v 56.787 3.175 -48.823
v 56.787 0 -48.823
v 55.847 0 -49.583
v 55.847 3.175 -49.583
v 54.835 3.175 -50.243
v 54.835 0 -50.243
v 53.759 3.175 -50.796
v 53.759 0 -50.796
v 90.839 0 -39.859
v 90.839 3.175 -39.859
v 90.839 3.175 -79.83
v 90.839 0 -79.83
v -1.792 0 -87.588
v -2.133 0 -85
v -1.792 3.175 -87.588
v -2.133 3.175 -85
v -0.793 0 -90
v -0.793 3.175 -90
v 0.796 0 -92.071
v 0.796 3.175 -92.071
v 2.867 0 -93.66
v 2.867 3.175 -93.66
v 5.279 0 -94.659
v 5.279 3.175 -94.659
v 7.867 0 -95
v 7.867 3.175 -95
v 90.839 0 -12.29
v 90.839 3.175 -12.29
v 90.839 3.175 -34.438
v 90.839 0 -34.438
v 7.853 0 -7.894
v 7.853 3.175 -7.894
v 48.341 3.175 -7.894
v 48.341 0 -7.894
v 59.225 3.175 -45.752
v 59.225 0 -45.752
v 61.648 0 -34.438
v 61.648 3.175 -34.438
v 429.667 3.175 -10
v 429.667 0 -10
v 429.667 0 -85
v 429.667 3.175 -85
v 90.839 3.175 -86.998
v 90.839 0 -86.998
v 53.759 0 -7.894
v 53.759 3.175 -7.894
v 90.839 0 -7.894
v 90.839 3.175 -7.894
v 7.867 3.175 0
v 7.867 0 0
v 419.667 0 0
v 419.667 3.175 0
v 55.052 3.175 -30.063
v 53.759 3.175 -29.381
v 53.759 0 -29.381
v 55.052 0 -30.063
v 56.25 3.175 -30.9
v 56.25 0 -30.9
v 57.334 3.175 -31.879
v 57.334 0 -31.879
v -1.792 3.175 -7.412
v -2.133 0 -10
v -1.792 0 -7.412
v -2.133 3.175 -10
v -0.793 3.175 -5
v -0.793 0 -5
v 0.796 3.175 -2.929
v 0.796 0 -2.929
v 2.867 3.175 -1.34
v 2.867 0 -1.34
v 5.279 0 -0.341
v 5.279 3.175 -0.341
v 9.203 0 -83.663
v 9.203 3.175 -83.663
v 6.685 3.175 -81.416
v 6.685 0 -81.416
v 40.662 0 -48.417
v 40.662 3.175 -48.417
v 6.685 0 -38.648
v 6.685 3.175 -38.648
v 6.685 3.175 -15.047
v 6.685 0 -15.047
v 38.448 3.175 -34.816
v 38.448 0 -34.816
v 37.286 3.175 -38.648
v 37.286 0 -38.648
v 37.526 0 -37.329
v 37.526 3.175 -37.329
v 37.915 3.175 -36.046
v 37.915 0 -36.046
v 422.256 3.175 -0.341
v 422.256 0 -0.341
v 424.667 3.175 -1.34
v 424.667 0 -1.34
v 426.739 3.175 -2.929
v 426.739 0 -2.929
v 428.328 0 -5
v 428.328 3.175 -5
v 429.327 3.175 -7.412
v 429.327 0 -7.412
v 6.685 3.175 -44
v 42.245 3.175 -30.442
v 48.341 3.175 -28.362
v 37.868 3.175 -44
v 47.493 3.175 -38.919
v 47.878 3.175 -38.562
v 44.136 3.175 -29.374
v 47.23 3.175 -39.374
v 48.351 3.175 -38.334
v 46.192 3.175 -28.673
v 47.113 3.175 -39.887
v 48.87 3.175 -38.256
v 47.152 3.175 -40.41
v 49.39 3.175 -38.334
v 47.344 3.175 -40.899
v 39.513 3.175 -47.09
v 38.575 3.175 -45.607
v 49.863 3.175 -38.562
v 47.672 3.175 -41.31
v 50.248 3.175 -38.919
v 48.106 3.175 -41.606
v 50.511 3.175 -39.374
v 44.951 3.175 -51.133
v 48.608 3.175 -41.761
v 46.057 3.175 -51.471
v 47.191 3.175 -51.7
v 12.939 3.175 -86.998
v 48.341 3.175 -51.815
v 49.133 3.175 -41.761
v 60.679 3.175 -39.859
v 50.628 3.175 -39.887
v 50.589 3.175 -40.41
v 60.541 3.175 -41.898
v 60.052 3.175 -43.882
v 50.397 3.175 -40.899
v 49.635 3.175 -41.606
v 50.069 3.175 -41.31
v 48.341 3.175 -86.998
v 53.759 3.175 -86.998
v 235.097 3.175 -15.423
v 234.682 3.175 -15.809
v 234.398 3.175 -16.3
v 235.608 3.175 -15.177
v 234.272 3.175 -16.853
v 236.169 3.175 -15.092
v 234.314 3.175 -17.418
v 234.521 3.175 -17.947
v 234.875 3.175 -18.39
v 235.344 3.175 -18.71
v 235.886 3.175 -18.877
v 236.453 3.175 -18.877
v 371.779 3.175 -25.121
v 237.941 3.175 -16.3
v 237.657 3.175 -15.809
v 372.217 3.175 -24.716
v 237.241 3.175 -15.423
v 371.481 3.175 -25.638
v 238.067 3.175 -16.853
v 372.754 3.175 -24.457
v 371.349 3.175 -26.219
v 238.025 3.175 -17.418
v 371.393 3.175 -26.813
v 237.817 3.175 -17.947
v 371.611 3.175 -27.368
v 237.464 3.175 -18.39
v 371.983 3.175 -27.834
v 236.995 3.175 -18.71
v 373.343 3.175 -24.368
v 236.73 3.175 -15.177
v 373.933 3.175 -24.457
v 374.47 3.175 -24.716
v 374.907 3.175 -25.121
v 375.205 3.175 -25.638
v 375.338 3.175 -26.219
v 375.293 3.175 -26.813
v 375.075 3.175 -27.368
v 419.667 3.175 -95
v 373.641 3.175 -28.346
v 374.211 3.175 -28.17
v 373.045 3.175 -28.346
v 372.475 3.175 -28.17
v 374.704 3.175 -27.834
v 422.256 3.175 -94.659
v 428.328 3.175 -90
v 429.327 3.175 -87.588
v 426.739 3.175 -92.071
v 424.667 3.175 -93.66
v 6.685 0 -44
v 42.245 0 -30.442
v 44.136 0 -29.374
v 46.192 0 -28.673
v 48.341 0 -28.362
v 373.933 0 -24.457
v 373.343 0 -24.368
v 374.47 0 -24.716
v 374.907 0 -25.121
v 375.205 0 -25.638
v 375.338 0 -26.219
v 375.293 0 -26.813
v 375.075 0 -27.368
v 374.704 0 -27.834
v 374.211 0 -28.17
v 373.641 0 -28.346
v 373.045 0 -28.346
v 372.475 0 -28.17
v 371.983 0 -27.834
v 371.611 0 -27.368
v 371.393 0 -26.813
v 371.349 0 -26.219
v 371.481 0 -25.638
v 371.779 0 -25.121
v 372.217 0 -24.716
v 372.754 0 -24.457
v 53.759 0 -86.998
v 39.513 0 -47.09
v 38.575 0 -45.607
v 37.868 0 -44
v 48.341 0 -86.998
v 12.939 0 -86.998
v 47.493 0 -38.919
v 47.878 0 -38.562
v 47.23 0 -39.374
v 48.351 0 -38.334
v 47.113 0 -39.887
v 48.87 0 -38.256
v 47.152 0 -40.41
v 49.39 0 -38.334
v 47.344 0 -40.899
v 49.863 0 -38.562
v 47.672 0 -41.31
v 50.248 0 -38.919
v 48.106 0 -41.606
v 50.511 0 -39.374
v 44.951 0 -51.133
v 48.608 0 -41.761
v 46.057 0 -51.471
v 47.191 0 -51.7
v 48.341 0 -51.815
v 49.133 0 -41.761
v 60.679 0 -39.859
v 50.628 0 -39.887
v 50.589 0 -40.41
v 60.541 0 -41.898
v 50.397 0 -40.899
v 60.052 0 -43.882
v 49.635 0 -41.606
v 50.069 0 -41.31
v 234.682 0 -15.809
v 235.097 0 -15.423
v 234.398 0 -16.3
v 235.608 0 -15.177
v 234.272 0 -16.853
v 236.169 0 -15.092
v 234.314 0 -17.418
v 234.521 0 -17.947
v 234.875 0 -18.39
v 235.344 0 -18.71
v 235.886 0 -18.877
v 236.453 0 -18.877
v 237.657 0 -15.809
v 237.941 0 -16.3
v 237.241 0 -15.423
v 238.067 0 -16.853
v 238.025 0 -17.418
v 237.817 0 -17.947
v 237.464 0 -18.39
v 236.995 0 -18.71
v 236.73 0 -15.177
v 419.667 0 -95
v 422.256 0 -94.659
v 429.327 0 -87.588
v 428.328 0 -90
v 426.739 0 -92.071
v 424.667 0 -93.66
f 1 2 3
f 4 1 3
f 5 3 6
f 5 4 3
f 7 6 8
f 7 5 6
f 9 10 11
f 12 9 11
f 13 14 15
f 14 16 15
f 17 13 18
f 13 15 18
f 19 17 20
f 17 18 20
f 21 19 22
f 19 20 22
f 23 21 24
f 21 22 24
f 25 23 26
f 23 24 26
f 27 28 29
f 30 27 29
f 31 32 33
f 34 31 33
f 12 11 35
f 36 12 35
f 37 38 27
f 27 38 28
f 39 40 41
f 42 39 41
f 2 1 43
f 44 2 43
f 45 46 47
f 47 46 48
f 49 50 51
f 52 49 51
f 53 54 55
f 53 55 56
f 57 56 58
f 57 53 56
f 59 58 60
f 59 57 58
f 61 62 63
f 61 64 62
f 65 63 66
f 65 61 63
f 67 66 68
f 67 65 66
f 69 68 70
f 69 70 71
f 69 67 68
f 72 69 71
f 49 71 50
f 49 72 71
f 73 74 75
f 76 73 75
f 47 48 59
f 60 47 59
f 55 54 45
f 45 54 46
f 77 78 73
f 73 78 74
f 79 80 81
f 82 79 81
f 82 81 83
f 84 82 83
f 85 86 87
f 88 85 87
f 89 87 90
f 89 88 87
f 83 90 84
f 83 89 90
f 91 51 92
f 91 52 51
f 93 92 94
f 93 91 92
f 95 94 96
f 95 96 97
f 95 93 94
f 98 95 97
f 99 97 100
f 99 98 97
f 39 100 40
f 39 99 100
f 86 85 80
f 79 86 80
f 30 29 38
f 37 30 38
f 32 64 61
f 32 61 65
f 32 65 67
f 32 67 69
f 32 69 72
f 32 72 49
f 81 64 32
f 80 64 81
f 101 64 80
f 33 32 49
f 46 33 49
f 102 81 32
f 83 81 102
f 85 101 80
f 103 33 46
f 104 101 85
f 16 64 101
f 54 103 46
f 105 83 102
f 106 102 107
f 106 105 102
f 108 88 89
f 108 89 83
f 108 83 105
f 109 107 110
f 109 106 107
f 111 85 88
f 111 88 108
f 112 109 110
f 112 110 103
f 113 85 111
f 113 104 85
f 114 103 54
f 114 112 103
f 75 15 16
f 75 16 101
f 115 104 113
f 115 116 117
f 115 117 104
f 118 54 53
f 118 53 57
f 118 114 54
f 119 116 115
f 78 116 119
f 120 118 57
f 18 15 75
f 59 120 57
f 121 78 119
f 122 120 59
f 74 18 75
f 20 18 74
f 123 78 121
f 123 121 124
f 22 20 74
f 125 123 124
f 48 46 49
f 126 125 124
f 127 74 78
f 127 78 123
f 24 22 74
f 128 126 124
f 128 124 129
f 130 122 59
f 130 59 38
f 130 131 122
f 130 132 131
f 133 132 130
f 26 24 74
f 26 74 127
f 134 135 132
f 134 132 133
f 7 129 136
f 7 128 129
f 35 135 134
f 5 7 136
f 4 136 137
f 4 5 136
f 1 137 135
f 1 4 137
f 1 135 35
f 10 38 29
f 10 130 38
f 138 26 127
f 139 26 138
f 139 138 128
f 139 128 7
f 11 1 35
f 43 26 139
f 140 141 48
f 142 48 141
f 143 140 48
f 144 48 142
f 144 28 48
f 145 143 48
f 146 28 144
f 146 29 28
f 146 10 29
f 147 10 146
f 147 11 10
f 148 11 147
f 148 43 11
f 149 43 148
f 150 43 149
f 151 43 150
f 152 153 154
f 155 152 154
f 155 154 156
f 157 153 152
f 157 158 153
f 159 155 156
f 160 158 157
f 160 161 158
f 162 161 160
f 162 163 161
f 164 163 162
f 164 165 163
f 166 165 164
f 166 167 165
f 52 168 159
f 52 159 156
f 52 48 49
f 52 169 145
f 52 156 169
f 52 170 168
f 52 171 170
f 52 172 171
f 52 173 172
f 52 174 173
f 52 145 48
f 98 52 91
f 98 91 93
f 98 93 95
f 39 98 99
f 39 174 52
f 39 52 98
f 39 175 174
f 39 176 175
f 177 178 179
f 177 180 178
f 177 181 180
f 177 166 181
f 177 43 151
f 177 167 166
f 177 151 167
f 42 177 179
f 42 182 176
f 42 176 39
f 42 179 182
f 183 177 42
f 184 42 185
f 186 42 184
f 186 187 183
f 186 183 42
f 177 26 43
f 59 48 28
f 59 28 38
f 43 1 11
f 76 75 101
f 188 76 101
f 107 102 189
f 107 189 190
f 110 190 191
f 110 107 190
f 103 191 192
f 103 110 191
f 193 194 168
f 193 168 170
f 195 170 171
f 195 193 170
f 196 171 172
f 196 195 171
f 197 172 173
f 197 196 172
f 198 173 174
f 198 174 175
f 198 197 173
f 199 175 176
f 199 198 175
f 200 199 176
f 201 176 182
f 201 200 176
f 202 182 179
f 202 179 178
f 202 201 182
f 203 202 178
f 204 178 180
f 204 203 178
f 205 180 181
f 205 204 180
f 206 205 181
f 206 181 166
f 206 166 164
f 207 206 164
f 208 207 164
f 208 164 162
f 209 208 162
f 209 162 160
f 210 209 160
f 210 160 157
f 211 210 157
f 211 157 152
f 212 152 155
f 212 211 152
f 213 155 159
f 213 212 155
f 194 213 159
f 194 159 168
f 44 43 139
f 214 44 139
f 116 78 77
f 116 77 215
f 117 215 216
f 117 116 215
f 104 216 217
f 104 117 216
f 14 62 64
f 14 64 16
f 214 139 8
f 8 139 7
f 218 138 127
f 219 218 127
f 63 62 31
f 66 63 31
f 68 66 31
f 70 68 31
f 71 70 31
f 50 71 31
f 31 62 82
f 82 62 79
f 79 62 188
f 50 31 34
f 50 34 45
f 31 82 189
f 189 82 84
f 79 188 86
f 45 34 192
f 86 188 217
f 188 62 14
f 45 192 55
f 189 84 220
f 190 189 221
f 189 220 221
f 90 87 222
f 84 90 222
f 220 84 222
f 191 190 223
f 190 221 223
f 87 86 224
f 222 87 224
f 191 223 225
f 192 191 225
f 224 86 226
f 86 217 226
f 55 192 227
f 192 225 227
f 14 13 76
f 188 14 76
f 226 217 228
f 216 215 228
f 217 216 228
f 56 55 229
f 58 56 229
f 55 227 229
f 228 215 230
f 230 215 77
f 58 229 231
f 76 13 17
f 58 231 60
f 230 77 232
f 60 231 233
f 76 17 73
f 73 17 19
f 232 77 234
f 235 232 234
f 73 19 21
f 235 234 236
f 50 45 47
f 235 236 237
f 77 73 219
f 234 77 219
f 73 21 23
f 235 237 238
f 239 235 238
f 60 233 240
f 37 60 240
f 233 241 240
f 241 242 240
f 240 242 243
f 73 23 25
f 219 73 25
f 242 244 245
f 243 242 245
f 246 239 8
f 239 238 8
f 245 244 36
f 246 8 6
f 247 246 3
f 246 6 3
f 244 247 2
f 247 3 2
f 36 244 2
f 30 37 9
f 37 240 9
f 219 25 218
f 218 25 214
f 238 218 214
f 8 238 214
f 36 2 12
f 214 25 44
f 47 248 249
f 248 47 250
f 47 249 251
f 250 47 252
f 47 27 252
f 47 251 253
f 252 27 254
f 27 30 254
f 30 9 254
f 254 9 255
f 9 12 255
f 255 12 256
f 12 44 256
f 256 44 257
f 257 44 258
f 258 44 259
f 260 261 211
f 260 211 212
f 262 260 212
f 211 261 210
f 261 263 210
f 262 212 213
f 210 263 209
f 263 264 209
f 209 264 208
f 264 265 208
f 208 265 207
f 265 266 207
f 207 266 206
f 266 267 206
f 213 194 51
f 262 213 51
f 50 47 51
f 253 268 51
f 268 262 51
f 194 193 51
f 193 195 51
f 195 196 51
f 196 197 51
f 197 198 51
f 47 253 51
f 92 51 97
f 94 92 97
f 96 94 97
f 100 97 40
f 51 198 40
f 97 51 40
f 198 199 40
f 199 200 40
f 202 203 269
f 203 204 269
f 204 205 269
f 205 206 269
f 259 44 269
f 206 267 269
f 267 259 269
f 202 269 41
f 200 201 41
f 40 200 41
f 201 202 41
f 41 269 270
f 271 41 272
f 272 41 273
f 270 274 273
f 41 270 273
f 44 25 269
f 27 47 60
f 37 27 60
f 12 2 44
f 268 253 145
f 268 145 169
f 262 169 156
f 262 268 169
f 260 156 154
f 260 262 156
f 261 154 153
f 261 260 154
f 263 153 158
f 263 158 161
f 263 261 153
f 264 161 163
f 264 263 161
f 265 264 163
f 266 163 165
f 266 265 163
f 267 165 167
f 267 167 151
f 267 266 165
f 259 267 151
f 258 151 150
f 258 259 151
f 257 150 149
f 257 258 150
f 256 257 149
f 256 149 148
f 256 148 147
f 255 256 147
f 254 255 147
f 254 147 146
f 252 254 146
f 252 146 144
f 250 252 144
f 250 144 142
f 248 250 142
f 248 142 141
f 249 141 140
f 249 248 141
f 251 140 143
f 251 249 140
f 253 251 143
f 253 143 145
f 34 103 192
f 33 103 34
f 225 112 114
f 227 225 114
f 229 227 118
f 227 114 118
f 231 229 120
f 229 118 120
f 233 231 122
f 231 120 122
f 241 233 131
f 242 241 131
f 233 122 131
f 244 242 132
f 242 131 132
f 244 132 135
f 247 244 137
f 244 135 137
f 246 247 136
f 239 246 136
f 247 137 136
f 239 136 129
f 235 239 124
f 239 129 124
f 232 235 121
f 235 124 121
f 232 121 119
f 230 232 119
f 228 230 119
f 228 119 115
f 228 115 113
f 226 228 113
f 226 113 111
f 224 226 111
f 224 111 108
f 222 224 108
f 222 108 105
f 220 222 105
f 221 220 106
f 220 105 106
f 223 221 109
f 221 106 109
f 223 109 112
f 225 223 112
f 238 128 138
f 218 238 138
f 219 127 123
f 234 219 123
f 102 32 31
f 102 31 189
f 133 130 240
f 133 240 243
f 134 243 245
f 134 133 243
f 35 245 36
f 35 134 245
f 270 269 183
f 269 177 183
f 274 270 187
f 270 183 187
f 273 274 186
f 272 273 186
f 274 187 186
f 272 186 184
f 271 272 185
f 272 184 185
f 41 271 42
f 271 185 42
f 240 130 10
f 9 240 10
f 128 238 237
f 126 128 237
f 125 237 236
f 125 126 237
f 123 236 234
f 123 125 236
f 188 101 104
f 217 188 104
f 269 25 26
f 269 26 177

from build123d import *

# Parameters (mm, degrees)
SKETCH1_W           = 431.8
SKETCH1_H           = 95
SKETCH1_R           = 1.770184209
SKETCH1_R_2         = 1.902933344
SKETCH1_R_3         = 2
BOSS_EXTRUDE1_DEPTH = 3.175
FILLET1_R           = 10
SKETCH10_R          = 9.179936936
BOSS_EXTRUDE3_DEPTH = 3.175
SKETCH11_R          = 1.770587682
CUT_EXTRUDE5_DEPTH  = 3.175
CUT_EXTRUDE6_DEPTH  = 3.175
SKETCH13_R          = 11.741940518
BOSS_EXTRUDE4_DEPTH = 3.175
SKETCH14_R          = 1.762256498
CUT_EXTRUDE8_DEPTH  = 3.175


with BuildPart() as part:
    # Sketch1 → Boss-Extrude1 (new body)
    with BuildSketch(Plane(origin=(0, 0, 0), x_dir=(1, 0, 0), z_dir=(0, 1, 0))):
        with Locations((213.767466267, 47.5)):
            Rectangle(SKETCH1_W, SKETCH1_H)
        with Locations(Location((48.867466267, 40.050297191, 0), (0, 0, 270))):
            Circle(SKETCH1_R, mode=Mode.SUBTRACT)
        with Locations(Location((236.169368623, 16.995054431, 0), (0, 0, 270))):
            Circle(SKETCH1_R_2, mode=Mode.SUBTRACT)
        with Locations(Location((373.343160921, 26.368316597, 0), (0, 0, 270))):
            Circle(SKETCH1_R_3, mode=Mode.SUBTRACT)
    extrude(amount=BOSS_EXTRUDE1_DEPTH)

    # Fillet1
    fillet1_edges = [part.edges().sort_by_distance(p)[0] for p in [
        (-2.132533733, 1.5875, -95),
        (429.667466267, 1.5875, -95),
        (429.667466267, 1.5875, 0),
        (-2.132533733, 1.5875, 0),
    ]]
    fillet(fillet1_edges, radius=FILLET1_R)

    # Sketch10 → Boss-Extrude3 (add)
    with BuildSketch(Plane.XZ):
        with Locations((48.867466267, -40.050297191)):
            Circle(SKETCH10_R)
    extrude(amount=-BOSS_EXTRUDE3_DEPTH)

    # Sketch11 → Cut-Extrude5 (cut)
    with BuildSketch(Plane(origin=(0, 3.175, 0), x_dir=(1, 0, 0), z_dir=(0, 1, 0))):
        with Locations(Location((48.939345921, 40.088578466, 0), (0, 0, 270))):
            Circle(SKETCH11_R)
    extrude(amount=-CUT_EXTRUDE5_DEPTH, mode=Mode.SUBTRACT)

    # Sketch12 → Cut-Extrude6 (cut)
    with BuildSketch(Plane(origin=(0, 3.175, 0), x_dir=(1, 0, 0), z_dir=(0, 1, 0))):
        Polygon((48.341279917, 47.334727349), (48.341279917, 86.998039631), (12.939315235, 86.998039631), align=None)
        Polygon((44.60489186, 43.999769414), (9.202927178, 83.663081696), (6.684860974, 81.41555153), (6.684860974, 43.999769414), align=None)
        Polygon((44.60489186, 38.648134163), (6.684860974, 38.648134163), (6.684860974, 15.046824375), align=None)
        Polygon((7.853230038, 7.893935302), (48.341279917, 34.438493177), (48.341279917, 7.893935302), (44.60489186, 7.893935302), align=None)
        Polygon((55.459972177, 47.334727349), (90.838679195, 86.998039631), (55.459972177, 86.998039631), (53.759123425, 86.998039631), (53.759123425, 45.871199809), align=None)
        Polygon((90.838679195, 39.858977136), (90.838679195, 79.830290994), (55.833686687, 42.095331309), (55.833686687, 39.858977136), align=None)
        Polygon((53.759123425, 34.438493177), (53.759123425, 7.893935302), (90.838679195, 7.893935302), align=None)
        Polygon((61.64788979, 34.438493177), (90.838679195, 12.290395062), (90.838679195, 34.438493177), align=None)
    extrude(amount=-CUT_EXTRUDE6_DEPTH, mode=Mode.SUBTRACT)

    # Sketch13 → Boss-Extrude4 (add)
    with BuildSketch(Plane(origin=(0, 3.175, 0), x_dir=(1, 0, 0), z_dir=(0, 1, 0))):
        with Locations((48.939345921, 40.088578466)):
            Circle(SKETCH13_R)
    extrude(amount=-BOSS_EXTRUDE4_DEPTH)

    # Sketch14 → Cut-Extrude8 (cut)
    with BuildSketch(Plane(origin=(0, 3.175, 0), x_dir=(1, 0, 0), z_dir=(0, 1, 0))):
        with Locations(Location((48.870433526, 40.018247237, 0), (0, 0, 270))):
            Circle(SKETCH14_R)
    extrude(amount=-CUT_EXTRUDE8_DEPTH, mode=Mode.SUBTRACT)


solid = part.part
